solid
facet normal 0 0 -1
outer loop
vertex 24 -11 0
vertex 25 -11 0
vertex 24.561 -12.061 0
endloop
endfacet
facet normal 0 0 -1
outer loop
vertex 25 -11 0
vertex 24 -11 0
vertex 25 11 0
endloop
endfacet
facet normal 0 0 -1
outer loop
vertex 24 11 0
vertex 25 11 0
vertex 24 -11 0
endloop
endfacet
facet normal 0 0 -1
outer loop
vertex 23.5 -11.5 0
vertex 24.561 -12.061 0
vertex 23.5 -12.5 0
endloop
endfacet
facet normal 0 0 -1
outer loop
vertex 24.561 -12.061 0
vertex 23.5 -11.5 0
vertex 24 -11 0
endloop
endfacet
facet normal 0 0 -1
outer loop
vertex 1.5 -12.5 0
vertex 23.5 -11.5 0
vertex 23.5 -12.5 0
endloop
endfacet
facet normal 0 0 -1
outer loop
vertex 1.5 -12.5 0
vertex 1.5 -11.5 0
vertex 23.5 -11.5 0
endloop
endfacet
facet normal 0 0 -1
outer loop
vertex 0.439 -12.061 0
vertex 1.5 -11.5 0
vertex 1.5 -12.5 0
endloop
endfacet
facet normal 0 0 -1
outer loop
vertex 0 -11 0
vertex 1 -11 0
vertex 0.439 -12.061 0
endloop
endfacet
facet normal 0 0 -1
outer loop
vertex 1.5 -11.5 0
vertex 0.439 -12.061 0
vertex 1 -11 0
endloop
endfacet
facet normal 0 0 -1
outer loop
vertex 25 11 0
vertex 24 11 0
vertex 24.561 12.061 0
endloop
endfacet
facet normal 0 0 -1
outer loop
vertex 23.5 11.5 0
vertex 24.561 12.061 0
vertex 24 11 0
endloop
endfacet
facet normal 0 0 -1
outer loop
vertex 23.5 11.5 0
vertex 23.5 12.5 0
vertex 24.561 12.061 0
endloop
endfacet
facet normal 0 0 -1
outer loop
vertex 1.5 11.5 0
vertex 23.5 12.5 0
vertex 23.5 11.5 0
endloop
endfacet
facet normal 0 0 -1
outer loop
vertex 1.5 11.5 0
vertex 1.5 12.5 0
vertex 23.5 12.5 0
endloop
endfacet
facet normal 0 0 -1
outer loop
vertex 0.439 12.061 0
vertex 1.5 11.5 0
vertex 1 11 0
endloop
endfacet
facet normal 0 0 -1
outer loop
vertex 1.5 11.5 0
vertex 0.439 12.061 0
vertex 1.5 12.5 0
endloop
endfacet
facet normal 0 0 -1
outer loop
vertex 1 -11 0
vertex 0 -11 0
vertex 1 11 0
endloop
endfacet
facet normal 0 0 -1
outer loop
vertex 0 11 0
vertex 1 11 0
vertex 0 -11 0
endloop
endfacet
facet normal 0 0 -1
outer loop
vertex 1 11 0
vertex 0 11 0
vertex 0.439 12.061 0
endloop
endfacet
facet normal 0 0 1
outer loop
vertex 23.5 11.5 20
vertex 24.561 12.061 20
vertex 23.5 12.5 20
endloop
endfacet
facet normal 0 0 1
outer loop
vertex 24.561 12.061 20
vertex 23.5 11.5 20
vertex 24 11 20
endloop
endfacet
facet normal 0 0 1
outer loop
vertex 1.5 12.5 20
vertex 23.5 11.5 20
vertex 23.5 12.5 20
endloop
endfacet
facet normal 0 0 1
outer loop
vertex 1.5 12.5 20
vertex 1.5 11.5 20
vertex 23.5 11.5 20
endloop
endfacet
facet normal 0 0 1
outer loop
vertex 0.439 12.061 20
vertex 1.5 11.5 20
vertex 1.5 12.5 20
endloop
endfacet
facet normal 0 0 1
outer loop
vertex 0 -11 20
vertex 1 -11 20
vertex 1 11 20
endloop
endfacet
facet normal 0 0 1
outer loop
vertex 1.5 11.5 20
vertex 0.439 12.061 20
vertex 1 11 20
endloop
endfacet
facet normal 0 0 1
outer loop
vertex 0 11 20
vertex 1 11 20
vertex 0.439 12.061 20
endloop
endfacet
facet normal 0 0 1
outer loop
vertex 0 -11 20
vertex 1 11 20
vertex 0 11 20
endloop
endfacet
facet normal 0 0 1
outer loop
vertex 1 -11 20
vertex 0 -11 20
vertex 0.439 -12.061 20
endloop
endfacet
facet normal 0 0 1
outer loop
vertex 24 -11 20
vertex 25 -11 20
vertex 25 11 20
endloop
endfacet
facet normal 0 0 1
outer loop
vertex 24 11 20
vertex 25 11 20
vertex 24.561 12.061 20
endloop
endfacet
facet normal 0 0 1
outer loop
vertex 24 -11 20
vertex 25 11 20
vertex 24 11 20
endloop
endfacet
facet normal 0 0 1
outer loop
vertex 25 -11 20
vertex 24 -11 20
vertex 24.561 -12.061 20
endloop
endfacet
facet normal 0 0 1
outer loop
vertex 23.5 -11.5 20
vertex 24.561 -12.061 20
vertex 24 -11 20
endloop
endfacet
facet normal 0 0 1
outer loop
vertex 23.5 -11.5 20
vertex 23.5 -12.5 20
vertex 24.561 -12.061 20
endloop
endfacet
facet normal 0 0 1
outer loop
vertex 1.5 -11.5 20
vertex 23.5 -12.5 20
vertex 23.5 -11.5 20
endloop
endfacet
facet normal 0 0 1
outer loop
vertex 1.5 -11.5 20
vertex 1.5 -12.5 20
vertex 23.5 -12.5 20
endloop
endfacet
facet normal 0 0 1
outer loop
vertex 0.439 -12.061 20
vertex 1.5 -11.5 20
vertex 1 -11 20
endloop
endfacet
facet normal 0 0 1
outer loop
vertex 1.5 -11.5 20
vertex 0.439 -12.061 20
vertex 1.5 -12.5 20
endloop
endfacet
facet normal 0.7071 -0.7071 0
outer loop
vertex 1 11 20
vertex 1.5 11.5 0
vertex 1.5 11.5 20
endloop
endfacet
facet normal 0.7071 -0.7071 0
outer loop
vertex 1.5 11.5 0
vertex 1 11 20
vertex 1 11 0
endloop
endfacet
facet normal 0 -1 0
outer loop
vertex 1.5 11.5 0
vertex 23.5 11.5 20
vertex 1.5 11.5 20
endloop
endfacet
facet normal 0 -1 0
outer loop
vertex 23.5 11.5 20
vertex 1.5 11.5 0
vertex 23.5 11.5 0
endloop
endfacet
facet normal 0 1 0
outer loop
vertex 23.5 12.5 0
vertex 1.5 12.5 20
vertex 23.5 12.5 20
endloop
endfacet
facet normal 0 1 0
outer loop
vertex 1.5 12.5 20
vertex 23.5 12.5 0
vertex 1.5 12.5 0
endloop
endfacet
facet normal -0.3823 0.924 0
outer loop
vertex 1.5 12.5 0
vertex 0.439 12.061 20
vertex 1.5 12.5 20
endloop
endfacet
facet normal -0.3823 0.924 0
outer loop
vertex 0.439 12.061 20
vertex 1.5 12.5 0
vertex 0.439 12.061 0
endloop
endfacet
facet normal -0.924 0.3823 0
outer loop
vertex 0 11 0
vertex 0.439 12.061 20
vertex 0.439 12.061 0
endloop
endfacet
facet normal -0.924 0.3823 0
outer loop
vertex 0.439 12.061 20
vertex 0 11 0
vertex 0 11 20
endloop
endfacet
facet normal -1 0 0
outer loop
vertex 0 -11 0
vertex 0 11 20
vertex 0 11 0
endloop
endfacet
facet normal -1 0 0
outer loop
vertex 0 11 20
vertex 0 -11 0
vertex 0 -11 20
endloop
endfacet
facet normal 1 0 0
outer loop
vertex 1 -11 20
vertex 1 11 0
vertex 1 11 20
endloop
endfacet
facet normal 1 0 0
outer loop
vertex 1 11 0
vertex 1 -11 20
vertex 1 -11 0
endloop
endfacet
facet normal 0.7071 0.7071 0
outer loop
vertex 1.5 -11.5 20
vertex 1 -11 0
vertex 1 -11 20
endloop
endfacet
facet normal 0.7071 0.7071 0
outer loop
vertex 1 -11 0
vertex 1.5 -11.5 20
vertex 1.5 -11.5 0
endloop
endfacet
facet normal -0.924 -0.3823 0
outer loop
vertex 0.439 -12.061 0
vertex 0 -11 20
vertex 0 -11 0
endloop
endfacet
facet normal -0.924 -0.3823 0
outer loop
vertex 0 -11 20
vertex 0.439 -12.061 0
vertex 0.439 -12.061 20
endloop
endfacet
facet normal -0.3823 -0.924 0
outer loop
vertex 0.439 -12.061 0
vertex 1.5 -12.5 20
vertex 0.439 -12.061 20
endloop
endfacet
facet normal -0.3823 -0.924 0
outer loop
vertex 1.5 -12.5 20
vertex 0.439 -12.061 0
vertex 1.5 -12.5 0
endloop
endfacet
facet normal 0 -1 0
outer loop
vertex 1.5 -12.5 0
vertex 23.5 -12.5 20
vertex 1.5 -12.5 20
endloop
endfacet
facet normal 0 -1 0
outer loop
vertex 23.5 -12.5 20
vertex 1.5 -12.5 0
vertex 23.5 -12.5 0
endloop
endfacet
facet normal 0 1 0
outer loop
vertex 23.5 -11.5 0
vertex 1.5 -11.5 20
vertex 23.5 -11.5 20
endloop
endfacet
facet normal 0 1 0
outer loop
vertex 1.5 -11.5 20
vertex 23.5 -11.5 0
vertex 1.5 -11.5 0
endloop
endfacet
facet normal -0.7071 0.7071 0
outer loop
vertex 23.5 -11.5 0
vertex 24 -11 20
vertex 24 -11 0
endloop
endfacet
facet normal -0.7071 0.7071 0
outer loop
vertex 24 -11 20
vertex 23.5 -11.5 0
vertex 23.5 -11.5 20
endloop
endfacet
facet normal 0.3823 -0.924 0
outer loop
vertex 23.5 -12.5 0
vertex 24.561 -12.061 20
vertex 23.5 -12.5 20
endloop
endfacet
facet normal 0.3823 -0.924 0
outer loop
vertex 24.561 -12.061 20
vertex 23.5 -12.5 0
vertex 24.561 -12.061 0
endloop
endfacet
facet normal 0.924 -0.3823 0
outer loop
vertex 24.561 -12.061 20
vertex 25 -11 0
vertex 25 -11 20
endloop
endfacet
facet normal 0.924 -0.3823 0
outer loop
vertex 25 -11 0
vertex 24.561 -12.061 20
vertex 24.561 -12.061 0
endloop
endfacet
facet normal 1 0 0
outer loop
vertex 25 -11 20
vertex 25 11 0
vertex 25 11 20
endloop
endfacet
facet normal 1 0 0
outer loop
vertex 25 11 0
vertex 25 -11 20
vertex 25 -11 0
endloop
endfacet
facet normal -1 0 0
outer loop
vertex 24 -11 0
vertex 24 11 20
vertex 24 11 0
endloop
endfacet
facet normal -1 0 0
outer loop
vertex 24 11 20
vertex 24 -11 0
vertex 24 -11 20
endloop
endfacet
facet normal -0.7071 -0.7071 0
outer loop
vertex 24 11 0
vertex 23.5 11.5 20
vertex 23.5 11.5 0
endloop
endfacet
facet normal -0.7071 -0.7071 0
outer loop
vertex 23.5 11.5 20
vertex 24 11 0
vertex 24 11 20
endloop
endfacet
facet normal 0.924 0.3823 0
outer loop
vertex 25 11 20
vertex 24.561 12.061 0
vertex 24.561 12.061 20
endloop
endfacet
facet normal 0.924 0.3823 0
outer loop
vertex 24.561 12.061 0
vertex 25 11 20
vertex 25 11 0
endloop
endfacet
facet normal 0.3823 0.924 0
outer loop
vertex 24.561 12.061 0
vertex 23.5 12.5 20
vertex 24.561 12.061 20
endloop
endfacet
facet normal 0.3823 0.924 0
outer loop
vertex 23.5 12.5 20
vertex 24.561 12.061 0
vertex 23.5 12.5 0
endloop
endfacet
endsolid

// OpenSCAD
len = 25;
height = 20;

module alusteck_profile(length=25) {
    k1 = length/2;
    cd = 1.5;
    di = 1;
    polygon(points=[
        [0,0],[0,k1-cd],
        [cd*(1.-cos(45)),k1-cd*(1.-cos(45))], //ecke
        [cd,k1],[k1,k1],
        [k1,k1-di],[cd,k1-di],
        [di,k1-cd],[di,0]
    ]);
}


linear_extrude(height) alusteck_profile();
translate([len/2,-len/2,0]) rotate([0,0,90]) linear_extrude(height) alusteck_profile();
translate([len,0,0]) rotate([0,0,180]) linear_extrude(height) alusteck_profile();
translate([len/2,len/2,0]) rotate([0,0,-90]) linear_extrude(height) alusteck_profile();
